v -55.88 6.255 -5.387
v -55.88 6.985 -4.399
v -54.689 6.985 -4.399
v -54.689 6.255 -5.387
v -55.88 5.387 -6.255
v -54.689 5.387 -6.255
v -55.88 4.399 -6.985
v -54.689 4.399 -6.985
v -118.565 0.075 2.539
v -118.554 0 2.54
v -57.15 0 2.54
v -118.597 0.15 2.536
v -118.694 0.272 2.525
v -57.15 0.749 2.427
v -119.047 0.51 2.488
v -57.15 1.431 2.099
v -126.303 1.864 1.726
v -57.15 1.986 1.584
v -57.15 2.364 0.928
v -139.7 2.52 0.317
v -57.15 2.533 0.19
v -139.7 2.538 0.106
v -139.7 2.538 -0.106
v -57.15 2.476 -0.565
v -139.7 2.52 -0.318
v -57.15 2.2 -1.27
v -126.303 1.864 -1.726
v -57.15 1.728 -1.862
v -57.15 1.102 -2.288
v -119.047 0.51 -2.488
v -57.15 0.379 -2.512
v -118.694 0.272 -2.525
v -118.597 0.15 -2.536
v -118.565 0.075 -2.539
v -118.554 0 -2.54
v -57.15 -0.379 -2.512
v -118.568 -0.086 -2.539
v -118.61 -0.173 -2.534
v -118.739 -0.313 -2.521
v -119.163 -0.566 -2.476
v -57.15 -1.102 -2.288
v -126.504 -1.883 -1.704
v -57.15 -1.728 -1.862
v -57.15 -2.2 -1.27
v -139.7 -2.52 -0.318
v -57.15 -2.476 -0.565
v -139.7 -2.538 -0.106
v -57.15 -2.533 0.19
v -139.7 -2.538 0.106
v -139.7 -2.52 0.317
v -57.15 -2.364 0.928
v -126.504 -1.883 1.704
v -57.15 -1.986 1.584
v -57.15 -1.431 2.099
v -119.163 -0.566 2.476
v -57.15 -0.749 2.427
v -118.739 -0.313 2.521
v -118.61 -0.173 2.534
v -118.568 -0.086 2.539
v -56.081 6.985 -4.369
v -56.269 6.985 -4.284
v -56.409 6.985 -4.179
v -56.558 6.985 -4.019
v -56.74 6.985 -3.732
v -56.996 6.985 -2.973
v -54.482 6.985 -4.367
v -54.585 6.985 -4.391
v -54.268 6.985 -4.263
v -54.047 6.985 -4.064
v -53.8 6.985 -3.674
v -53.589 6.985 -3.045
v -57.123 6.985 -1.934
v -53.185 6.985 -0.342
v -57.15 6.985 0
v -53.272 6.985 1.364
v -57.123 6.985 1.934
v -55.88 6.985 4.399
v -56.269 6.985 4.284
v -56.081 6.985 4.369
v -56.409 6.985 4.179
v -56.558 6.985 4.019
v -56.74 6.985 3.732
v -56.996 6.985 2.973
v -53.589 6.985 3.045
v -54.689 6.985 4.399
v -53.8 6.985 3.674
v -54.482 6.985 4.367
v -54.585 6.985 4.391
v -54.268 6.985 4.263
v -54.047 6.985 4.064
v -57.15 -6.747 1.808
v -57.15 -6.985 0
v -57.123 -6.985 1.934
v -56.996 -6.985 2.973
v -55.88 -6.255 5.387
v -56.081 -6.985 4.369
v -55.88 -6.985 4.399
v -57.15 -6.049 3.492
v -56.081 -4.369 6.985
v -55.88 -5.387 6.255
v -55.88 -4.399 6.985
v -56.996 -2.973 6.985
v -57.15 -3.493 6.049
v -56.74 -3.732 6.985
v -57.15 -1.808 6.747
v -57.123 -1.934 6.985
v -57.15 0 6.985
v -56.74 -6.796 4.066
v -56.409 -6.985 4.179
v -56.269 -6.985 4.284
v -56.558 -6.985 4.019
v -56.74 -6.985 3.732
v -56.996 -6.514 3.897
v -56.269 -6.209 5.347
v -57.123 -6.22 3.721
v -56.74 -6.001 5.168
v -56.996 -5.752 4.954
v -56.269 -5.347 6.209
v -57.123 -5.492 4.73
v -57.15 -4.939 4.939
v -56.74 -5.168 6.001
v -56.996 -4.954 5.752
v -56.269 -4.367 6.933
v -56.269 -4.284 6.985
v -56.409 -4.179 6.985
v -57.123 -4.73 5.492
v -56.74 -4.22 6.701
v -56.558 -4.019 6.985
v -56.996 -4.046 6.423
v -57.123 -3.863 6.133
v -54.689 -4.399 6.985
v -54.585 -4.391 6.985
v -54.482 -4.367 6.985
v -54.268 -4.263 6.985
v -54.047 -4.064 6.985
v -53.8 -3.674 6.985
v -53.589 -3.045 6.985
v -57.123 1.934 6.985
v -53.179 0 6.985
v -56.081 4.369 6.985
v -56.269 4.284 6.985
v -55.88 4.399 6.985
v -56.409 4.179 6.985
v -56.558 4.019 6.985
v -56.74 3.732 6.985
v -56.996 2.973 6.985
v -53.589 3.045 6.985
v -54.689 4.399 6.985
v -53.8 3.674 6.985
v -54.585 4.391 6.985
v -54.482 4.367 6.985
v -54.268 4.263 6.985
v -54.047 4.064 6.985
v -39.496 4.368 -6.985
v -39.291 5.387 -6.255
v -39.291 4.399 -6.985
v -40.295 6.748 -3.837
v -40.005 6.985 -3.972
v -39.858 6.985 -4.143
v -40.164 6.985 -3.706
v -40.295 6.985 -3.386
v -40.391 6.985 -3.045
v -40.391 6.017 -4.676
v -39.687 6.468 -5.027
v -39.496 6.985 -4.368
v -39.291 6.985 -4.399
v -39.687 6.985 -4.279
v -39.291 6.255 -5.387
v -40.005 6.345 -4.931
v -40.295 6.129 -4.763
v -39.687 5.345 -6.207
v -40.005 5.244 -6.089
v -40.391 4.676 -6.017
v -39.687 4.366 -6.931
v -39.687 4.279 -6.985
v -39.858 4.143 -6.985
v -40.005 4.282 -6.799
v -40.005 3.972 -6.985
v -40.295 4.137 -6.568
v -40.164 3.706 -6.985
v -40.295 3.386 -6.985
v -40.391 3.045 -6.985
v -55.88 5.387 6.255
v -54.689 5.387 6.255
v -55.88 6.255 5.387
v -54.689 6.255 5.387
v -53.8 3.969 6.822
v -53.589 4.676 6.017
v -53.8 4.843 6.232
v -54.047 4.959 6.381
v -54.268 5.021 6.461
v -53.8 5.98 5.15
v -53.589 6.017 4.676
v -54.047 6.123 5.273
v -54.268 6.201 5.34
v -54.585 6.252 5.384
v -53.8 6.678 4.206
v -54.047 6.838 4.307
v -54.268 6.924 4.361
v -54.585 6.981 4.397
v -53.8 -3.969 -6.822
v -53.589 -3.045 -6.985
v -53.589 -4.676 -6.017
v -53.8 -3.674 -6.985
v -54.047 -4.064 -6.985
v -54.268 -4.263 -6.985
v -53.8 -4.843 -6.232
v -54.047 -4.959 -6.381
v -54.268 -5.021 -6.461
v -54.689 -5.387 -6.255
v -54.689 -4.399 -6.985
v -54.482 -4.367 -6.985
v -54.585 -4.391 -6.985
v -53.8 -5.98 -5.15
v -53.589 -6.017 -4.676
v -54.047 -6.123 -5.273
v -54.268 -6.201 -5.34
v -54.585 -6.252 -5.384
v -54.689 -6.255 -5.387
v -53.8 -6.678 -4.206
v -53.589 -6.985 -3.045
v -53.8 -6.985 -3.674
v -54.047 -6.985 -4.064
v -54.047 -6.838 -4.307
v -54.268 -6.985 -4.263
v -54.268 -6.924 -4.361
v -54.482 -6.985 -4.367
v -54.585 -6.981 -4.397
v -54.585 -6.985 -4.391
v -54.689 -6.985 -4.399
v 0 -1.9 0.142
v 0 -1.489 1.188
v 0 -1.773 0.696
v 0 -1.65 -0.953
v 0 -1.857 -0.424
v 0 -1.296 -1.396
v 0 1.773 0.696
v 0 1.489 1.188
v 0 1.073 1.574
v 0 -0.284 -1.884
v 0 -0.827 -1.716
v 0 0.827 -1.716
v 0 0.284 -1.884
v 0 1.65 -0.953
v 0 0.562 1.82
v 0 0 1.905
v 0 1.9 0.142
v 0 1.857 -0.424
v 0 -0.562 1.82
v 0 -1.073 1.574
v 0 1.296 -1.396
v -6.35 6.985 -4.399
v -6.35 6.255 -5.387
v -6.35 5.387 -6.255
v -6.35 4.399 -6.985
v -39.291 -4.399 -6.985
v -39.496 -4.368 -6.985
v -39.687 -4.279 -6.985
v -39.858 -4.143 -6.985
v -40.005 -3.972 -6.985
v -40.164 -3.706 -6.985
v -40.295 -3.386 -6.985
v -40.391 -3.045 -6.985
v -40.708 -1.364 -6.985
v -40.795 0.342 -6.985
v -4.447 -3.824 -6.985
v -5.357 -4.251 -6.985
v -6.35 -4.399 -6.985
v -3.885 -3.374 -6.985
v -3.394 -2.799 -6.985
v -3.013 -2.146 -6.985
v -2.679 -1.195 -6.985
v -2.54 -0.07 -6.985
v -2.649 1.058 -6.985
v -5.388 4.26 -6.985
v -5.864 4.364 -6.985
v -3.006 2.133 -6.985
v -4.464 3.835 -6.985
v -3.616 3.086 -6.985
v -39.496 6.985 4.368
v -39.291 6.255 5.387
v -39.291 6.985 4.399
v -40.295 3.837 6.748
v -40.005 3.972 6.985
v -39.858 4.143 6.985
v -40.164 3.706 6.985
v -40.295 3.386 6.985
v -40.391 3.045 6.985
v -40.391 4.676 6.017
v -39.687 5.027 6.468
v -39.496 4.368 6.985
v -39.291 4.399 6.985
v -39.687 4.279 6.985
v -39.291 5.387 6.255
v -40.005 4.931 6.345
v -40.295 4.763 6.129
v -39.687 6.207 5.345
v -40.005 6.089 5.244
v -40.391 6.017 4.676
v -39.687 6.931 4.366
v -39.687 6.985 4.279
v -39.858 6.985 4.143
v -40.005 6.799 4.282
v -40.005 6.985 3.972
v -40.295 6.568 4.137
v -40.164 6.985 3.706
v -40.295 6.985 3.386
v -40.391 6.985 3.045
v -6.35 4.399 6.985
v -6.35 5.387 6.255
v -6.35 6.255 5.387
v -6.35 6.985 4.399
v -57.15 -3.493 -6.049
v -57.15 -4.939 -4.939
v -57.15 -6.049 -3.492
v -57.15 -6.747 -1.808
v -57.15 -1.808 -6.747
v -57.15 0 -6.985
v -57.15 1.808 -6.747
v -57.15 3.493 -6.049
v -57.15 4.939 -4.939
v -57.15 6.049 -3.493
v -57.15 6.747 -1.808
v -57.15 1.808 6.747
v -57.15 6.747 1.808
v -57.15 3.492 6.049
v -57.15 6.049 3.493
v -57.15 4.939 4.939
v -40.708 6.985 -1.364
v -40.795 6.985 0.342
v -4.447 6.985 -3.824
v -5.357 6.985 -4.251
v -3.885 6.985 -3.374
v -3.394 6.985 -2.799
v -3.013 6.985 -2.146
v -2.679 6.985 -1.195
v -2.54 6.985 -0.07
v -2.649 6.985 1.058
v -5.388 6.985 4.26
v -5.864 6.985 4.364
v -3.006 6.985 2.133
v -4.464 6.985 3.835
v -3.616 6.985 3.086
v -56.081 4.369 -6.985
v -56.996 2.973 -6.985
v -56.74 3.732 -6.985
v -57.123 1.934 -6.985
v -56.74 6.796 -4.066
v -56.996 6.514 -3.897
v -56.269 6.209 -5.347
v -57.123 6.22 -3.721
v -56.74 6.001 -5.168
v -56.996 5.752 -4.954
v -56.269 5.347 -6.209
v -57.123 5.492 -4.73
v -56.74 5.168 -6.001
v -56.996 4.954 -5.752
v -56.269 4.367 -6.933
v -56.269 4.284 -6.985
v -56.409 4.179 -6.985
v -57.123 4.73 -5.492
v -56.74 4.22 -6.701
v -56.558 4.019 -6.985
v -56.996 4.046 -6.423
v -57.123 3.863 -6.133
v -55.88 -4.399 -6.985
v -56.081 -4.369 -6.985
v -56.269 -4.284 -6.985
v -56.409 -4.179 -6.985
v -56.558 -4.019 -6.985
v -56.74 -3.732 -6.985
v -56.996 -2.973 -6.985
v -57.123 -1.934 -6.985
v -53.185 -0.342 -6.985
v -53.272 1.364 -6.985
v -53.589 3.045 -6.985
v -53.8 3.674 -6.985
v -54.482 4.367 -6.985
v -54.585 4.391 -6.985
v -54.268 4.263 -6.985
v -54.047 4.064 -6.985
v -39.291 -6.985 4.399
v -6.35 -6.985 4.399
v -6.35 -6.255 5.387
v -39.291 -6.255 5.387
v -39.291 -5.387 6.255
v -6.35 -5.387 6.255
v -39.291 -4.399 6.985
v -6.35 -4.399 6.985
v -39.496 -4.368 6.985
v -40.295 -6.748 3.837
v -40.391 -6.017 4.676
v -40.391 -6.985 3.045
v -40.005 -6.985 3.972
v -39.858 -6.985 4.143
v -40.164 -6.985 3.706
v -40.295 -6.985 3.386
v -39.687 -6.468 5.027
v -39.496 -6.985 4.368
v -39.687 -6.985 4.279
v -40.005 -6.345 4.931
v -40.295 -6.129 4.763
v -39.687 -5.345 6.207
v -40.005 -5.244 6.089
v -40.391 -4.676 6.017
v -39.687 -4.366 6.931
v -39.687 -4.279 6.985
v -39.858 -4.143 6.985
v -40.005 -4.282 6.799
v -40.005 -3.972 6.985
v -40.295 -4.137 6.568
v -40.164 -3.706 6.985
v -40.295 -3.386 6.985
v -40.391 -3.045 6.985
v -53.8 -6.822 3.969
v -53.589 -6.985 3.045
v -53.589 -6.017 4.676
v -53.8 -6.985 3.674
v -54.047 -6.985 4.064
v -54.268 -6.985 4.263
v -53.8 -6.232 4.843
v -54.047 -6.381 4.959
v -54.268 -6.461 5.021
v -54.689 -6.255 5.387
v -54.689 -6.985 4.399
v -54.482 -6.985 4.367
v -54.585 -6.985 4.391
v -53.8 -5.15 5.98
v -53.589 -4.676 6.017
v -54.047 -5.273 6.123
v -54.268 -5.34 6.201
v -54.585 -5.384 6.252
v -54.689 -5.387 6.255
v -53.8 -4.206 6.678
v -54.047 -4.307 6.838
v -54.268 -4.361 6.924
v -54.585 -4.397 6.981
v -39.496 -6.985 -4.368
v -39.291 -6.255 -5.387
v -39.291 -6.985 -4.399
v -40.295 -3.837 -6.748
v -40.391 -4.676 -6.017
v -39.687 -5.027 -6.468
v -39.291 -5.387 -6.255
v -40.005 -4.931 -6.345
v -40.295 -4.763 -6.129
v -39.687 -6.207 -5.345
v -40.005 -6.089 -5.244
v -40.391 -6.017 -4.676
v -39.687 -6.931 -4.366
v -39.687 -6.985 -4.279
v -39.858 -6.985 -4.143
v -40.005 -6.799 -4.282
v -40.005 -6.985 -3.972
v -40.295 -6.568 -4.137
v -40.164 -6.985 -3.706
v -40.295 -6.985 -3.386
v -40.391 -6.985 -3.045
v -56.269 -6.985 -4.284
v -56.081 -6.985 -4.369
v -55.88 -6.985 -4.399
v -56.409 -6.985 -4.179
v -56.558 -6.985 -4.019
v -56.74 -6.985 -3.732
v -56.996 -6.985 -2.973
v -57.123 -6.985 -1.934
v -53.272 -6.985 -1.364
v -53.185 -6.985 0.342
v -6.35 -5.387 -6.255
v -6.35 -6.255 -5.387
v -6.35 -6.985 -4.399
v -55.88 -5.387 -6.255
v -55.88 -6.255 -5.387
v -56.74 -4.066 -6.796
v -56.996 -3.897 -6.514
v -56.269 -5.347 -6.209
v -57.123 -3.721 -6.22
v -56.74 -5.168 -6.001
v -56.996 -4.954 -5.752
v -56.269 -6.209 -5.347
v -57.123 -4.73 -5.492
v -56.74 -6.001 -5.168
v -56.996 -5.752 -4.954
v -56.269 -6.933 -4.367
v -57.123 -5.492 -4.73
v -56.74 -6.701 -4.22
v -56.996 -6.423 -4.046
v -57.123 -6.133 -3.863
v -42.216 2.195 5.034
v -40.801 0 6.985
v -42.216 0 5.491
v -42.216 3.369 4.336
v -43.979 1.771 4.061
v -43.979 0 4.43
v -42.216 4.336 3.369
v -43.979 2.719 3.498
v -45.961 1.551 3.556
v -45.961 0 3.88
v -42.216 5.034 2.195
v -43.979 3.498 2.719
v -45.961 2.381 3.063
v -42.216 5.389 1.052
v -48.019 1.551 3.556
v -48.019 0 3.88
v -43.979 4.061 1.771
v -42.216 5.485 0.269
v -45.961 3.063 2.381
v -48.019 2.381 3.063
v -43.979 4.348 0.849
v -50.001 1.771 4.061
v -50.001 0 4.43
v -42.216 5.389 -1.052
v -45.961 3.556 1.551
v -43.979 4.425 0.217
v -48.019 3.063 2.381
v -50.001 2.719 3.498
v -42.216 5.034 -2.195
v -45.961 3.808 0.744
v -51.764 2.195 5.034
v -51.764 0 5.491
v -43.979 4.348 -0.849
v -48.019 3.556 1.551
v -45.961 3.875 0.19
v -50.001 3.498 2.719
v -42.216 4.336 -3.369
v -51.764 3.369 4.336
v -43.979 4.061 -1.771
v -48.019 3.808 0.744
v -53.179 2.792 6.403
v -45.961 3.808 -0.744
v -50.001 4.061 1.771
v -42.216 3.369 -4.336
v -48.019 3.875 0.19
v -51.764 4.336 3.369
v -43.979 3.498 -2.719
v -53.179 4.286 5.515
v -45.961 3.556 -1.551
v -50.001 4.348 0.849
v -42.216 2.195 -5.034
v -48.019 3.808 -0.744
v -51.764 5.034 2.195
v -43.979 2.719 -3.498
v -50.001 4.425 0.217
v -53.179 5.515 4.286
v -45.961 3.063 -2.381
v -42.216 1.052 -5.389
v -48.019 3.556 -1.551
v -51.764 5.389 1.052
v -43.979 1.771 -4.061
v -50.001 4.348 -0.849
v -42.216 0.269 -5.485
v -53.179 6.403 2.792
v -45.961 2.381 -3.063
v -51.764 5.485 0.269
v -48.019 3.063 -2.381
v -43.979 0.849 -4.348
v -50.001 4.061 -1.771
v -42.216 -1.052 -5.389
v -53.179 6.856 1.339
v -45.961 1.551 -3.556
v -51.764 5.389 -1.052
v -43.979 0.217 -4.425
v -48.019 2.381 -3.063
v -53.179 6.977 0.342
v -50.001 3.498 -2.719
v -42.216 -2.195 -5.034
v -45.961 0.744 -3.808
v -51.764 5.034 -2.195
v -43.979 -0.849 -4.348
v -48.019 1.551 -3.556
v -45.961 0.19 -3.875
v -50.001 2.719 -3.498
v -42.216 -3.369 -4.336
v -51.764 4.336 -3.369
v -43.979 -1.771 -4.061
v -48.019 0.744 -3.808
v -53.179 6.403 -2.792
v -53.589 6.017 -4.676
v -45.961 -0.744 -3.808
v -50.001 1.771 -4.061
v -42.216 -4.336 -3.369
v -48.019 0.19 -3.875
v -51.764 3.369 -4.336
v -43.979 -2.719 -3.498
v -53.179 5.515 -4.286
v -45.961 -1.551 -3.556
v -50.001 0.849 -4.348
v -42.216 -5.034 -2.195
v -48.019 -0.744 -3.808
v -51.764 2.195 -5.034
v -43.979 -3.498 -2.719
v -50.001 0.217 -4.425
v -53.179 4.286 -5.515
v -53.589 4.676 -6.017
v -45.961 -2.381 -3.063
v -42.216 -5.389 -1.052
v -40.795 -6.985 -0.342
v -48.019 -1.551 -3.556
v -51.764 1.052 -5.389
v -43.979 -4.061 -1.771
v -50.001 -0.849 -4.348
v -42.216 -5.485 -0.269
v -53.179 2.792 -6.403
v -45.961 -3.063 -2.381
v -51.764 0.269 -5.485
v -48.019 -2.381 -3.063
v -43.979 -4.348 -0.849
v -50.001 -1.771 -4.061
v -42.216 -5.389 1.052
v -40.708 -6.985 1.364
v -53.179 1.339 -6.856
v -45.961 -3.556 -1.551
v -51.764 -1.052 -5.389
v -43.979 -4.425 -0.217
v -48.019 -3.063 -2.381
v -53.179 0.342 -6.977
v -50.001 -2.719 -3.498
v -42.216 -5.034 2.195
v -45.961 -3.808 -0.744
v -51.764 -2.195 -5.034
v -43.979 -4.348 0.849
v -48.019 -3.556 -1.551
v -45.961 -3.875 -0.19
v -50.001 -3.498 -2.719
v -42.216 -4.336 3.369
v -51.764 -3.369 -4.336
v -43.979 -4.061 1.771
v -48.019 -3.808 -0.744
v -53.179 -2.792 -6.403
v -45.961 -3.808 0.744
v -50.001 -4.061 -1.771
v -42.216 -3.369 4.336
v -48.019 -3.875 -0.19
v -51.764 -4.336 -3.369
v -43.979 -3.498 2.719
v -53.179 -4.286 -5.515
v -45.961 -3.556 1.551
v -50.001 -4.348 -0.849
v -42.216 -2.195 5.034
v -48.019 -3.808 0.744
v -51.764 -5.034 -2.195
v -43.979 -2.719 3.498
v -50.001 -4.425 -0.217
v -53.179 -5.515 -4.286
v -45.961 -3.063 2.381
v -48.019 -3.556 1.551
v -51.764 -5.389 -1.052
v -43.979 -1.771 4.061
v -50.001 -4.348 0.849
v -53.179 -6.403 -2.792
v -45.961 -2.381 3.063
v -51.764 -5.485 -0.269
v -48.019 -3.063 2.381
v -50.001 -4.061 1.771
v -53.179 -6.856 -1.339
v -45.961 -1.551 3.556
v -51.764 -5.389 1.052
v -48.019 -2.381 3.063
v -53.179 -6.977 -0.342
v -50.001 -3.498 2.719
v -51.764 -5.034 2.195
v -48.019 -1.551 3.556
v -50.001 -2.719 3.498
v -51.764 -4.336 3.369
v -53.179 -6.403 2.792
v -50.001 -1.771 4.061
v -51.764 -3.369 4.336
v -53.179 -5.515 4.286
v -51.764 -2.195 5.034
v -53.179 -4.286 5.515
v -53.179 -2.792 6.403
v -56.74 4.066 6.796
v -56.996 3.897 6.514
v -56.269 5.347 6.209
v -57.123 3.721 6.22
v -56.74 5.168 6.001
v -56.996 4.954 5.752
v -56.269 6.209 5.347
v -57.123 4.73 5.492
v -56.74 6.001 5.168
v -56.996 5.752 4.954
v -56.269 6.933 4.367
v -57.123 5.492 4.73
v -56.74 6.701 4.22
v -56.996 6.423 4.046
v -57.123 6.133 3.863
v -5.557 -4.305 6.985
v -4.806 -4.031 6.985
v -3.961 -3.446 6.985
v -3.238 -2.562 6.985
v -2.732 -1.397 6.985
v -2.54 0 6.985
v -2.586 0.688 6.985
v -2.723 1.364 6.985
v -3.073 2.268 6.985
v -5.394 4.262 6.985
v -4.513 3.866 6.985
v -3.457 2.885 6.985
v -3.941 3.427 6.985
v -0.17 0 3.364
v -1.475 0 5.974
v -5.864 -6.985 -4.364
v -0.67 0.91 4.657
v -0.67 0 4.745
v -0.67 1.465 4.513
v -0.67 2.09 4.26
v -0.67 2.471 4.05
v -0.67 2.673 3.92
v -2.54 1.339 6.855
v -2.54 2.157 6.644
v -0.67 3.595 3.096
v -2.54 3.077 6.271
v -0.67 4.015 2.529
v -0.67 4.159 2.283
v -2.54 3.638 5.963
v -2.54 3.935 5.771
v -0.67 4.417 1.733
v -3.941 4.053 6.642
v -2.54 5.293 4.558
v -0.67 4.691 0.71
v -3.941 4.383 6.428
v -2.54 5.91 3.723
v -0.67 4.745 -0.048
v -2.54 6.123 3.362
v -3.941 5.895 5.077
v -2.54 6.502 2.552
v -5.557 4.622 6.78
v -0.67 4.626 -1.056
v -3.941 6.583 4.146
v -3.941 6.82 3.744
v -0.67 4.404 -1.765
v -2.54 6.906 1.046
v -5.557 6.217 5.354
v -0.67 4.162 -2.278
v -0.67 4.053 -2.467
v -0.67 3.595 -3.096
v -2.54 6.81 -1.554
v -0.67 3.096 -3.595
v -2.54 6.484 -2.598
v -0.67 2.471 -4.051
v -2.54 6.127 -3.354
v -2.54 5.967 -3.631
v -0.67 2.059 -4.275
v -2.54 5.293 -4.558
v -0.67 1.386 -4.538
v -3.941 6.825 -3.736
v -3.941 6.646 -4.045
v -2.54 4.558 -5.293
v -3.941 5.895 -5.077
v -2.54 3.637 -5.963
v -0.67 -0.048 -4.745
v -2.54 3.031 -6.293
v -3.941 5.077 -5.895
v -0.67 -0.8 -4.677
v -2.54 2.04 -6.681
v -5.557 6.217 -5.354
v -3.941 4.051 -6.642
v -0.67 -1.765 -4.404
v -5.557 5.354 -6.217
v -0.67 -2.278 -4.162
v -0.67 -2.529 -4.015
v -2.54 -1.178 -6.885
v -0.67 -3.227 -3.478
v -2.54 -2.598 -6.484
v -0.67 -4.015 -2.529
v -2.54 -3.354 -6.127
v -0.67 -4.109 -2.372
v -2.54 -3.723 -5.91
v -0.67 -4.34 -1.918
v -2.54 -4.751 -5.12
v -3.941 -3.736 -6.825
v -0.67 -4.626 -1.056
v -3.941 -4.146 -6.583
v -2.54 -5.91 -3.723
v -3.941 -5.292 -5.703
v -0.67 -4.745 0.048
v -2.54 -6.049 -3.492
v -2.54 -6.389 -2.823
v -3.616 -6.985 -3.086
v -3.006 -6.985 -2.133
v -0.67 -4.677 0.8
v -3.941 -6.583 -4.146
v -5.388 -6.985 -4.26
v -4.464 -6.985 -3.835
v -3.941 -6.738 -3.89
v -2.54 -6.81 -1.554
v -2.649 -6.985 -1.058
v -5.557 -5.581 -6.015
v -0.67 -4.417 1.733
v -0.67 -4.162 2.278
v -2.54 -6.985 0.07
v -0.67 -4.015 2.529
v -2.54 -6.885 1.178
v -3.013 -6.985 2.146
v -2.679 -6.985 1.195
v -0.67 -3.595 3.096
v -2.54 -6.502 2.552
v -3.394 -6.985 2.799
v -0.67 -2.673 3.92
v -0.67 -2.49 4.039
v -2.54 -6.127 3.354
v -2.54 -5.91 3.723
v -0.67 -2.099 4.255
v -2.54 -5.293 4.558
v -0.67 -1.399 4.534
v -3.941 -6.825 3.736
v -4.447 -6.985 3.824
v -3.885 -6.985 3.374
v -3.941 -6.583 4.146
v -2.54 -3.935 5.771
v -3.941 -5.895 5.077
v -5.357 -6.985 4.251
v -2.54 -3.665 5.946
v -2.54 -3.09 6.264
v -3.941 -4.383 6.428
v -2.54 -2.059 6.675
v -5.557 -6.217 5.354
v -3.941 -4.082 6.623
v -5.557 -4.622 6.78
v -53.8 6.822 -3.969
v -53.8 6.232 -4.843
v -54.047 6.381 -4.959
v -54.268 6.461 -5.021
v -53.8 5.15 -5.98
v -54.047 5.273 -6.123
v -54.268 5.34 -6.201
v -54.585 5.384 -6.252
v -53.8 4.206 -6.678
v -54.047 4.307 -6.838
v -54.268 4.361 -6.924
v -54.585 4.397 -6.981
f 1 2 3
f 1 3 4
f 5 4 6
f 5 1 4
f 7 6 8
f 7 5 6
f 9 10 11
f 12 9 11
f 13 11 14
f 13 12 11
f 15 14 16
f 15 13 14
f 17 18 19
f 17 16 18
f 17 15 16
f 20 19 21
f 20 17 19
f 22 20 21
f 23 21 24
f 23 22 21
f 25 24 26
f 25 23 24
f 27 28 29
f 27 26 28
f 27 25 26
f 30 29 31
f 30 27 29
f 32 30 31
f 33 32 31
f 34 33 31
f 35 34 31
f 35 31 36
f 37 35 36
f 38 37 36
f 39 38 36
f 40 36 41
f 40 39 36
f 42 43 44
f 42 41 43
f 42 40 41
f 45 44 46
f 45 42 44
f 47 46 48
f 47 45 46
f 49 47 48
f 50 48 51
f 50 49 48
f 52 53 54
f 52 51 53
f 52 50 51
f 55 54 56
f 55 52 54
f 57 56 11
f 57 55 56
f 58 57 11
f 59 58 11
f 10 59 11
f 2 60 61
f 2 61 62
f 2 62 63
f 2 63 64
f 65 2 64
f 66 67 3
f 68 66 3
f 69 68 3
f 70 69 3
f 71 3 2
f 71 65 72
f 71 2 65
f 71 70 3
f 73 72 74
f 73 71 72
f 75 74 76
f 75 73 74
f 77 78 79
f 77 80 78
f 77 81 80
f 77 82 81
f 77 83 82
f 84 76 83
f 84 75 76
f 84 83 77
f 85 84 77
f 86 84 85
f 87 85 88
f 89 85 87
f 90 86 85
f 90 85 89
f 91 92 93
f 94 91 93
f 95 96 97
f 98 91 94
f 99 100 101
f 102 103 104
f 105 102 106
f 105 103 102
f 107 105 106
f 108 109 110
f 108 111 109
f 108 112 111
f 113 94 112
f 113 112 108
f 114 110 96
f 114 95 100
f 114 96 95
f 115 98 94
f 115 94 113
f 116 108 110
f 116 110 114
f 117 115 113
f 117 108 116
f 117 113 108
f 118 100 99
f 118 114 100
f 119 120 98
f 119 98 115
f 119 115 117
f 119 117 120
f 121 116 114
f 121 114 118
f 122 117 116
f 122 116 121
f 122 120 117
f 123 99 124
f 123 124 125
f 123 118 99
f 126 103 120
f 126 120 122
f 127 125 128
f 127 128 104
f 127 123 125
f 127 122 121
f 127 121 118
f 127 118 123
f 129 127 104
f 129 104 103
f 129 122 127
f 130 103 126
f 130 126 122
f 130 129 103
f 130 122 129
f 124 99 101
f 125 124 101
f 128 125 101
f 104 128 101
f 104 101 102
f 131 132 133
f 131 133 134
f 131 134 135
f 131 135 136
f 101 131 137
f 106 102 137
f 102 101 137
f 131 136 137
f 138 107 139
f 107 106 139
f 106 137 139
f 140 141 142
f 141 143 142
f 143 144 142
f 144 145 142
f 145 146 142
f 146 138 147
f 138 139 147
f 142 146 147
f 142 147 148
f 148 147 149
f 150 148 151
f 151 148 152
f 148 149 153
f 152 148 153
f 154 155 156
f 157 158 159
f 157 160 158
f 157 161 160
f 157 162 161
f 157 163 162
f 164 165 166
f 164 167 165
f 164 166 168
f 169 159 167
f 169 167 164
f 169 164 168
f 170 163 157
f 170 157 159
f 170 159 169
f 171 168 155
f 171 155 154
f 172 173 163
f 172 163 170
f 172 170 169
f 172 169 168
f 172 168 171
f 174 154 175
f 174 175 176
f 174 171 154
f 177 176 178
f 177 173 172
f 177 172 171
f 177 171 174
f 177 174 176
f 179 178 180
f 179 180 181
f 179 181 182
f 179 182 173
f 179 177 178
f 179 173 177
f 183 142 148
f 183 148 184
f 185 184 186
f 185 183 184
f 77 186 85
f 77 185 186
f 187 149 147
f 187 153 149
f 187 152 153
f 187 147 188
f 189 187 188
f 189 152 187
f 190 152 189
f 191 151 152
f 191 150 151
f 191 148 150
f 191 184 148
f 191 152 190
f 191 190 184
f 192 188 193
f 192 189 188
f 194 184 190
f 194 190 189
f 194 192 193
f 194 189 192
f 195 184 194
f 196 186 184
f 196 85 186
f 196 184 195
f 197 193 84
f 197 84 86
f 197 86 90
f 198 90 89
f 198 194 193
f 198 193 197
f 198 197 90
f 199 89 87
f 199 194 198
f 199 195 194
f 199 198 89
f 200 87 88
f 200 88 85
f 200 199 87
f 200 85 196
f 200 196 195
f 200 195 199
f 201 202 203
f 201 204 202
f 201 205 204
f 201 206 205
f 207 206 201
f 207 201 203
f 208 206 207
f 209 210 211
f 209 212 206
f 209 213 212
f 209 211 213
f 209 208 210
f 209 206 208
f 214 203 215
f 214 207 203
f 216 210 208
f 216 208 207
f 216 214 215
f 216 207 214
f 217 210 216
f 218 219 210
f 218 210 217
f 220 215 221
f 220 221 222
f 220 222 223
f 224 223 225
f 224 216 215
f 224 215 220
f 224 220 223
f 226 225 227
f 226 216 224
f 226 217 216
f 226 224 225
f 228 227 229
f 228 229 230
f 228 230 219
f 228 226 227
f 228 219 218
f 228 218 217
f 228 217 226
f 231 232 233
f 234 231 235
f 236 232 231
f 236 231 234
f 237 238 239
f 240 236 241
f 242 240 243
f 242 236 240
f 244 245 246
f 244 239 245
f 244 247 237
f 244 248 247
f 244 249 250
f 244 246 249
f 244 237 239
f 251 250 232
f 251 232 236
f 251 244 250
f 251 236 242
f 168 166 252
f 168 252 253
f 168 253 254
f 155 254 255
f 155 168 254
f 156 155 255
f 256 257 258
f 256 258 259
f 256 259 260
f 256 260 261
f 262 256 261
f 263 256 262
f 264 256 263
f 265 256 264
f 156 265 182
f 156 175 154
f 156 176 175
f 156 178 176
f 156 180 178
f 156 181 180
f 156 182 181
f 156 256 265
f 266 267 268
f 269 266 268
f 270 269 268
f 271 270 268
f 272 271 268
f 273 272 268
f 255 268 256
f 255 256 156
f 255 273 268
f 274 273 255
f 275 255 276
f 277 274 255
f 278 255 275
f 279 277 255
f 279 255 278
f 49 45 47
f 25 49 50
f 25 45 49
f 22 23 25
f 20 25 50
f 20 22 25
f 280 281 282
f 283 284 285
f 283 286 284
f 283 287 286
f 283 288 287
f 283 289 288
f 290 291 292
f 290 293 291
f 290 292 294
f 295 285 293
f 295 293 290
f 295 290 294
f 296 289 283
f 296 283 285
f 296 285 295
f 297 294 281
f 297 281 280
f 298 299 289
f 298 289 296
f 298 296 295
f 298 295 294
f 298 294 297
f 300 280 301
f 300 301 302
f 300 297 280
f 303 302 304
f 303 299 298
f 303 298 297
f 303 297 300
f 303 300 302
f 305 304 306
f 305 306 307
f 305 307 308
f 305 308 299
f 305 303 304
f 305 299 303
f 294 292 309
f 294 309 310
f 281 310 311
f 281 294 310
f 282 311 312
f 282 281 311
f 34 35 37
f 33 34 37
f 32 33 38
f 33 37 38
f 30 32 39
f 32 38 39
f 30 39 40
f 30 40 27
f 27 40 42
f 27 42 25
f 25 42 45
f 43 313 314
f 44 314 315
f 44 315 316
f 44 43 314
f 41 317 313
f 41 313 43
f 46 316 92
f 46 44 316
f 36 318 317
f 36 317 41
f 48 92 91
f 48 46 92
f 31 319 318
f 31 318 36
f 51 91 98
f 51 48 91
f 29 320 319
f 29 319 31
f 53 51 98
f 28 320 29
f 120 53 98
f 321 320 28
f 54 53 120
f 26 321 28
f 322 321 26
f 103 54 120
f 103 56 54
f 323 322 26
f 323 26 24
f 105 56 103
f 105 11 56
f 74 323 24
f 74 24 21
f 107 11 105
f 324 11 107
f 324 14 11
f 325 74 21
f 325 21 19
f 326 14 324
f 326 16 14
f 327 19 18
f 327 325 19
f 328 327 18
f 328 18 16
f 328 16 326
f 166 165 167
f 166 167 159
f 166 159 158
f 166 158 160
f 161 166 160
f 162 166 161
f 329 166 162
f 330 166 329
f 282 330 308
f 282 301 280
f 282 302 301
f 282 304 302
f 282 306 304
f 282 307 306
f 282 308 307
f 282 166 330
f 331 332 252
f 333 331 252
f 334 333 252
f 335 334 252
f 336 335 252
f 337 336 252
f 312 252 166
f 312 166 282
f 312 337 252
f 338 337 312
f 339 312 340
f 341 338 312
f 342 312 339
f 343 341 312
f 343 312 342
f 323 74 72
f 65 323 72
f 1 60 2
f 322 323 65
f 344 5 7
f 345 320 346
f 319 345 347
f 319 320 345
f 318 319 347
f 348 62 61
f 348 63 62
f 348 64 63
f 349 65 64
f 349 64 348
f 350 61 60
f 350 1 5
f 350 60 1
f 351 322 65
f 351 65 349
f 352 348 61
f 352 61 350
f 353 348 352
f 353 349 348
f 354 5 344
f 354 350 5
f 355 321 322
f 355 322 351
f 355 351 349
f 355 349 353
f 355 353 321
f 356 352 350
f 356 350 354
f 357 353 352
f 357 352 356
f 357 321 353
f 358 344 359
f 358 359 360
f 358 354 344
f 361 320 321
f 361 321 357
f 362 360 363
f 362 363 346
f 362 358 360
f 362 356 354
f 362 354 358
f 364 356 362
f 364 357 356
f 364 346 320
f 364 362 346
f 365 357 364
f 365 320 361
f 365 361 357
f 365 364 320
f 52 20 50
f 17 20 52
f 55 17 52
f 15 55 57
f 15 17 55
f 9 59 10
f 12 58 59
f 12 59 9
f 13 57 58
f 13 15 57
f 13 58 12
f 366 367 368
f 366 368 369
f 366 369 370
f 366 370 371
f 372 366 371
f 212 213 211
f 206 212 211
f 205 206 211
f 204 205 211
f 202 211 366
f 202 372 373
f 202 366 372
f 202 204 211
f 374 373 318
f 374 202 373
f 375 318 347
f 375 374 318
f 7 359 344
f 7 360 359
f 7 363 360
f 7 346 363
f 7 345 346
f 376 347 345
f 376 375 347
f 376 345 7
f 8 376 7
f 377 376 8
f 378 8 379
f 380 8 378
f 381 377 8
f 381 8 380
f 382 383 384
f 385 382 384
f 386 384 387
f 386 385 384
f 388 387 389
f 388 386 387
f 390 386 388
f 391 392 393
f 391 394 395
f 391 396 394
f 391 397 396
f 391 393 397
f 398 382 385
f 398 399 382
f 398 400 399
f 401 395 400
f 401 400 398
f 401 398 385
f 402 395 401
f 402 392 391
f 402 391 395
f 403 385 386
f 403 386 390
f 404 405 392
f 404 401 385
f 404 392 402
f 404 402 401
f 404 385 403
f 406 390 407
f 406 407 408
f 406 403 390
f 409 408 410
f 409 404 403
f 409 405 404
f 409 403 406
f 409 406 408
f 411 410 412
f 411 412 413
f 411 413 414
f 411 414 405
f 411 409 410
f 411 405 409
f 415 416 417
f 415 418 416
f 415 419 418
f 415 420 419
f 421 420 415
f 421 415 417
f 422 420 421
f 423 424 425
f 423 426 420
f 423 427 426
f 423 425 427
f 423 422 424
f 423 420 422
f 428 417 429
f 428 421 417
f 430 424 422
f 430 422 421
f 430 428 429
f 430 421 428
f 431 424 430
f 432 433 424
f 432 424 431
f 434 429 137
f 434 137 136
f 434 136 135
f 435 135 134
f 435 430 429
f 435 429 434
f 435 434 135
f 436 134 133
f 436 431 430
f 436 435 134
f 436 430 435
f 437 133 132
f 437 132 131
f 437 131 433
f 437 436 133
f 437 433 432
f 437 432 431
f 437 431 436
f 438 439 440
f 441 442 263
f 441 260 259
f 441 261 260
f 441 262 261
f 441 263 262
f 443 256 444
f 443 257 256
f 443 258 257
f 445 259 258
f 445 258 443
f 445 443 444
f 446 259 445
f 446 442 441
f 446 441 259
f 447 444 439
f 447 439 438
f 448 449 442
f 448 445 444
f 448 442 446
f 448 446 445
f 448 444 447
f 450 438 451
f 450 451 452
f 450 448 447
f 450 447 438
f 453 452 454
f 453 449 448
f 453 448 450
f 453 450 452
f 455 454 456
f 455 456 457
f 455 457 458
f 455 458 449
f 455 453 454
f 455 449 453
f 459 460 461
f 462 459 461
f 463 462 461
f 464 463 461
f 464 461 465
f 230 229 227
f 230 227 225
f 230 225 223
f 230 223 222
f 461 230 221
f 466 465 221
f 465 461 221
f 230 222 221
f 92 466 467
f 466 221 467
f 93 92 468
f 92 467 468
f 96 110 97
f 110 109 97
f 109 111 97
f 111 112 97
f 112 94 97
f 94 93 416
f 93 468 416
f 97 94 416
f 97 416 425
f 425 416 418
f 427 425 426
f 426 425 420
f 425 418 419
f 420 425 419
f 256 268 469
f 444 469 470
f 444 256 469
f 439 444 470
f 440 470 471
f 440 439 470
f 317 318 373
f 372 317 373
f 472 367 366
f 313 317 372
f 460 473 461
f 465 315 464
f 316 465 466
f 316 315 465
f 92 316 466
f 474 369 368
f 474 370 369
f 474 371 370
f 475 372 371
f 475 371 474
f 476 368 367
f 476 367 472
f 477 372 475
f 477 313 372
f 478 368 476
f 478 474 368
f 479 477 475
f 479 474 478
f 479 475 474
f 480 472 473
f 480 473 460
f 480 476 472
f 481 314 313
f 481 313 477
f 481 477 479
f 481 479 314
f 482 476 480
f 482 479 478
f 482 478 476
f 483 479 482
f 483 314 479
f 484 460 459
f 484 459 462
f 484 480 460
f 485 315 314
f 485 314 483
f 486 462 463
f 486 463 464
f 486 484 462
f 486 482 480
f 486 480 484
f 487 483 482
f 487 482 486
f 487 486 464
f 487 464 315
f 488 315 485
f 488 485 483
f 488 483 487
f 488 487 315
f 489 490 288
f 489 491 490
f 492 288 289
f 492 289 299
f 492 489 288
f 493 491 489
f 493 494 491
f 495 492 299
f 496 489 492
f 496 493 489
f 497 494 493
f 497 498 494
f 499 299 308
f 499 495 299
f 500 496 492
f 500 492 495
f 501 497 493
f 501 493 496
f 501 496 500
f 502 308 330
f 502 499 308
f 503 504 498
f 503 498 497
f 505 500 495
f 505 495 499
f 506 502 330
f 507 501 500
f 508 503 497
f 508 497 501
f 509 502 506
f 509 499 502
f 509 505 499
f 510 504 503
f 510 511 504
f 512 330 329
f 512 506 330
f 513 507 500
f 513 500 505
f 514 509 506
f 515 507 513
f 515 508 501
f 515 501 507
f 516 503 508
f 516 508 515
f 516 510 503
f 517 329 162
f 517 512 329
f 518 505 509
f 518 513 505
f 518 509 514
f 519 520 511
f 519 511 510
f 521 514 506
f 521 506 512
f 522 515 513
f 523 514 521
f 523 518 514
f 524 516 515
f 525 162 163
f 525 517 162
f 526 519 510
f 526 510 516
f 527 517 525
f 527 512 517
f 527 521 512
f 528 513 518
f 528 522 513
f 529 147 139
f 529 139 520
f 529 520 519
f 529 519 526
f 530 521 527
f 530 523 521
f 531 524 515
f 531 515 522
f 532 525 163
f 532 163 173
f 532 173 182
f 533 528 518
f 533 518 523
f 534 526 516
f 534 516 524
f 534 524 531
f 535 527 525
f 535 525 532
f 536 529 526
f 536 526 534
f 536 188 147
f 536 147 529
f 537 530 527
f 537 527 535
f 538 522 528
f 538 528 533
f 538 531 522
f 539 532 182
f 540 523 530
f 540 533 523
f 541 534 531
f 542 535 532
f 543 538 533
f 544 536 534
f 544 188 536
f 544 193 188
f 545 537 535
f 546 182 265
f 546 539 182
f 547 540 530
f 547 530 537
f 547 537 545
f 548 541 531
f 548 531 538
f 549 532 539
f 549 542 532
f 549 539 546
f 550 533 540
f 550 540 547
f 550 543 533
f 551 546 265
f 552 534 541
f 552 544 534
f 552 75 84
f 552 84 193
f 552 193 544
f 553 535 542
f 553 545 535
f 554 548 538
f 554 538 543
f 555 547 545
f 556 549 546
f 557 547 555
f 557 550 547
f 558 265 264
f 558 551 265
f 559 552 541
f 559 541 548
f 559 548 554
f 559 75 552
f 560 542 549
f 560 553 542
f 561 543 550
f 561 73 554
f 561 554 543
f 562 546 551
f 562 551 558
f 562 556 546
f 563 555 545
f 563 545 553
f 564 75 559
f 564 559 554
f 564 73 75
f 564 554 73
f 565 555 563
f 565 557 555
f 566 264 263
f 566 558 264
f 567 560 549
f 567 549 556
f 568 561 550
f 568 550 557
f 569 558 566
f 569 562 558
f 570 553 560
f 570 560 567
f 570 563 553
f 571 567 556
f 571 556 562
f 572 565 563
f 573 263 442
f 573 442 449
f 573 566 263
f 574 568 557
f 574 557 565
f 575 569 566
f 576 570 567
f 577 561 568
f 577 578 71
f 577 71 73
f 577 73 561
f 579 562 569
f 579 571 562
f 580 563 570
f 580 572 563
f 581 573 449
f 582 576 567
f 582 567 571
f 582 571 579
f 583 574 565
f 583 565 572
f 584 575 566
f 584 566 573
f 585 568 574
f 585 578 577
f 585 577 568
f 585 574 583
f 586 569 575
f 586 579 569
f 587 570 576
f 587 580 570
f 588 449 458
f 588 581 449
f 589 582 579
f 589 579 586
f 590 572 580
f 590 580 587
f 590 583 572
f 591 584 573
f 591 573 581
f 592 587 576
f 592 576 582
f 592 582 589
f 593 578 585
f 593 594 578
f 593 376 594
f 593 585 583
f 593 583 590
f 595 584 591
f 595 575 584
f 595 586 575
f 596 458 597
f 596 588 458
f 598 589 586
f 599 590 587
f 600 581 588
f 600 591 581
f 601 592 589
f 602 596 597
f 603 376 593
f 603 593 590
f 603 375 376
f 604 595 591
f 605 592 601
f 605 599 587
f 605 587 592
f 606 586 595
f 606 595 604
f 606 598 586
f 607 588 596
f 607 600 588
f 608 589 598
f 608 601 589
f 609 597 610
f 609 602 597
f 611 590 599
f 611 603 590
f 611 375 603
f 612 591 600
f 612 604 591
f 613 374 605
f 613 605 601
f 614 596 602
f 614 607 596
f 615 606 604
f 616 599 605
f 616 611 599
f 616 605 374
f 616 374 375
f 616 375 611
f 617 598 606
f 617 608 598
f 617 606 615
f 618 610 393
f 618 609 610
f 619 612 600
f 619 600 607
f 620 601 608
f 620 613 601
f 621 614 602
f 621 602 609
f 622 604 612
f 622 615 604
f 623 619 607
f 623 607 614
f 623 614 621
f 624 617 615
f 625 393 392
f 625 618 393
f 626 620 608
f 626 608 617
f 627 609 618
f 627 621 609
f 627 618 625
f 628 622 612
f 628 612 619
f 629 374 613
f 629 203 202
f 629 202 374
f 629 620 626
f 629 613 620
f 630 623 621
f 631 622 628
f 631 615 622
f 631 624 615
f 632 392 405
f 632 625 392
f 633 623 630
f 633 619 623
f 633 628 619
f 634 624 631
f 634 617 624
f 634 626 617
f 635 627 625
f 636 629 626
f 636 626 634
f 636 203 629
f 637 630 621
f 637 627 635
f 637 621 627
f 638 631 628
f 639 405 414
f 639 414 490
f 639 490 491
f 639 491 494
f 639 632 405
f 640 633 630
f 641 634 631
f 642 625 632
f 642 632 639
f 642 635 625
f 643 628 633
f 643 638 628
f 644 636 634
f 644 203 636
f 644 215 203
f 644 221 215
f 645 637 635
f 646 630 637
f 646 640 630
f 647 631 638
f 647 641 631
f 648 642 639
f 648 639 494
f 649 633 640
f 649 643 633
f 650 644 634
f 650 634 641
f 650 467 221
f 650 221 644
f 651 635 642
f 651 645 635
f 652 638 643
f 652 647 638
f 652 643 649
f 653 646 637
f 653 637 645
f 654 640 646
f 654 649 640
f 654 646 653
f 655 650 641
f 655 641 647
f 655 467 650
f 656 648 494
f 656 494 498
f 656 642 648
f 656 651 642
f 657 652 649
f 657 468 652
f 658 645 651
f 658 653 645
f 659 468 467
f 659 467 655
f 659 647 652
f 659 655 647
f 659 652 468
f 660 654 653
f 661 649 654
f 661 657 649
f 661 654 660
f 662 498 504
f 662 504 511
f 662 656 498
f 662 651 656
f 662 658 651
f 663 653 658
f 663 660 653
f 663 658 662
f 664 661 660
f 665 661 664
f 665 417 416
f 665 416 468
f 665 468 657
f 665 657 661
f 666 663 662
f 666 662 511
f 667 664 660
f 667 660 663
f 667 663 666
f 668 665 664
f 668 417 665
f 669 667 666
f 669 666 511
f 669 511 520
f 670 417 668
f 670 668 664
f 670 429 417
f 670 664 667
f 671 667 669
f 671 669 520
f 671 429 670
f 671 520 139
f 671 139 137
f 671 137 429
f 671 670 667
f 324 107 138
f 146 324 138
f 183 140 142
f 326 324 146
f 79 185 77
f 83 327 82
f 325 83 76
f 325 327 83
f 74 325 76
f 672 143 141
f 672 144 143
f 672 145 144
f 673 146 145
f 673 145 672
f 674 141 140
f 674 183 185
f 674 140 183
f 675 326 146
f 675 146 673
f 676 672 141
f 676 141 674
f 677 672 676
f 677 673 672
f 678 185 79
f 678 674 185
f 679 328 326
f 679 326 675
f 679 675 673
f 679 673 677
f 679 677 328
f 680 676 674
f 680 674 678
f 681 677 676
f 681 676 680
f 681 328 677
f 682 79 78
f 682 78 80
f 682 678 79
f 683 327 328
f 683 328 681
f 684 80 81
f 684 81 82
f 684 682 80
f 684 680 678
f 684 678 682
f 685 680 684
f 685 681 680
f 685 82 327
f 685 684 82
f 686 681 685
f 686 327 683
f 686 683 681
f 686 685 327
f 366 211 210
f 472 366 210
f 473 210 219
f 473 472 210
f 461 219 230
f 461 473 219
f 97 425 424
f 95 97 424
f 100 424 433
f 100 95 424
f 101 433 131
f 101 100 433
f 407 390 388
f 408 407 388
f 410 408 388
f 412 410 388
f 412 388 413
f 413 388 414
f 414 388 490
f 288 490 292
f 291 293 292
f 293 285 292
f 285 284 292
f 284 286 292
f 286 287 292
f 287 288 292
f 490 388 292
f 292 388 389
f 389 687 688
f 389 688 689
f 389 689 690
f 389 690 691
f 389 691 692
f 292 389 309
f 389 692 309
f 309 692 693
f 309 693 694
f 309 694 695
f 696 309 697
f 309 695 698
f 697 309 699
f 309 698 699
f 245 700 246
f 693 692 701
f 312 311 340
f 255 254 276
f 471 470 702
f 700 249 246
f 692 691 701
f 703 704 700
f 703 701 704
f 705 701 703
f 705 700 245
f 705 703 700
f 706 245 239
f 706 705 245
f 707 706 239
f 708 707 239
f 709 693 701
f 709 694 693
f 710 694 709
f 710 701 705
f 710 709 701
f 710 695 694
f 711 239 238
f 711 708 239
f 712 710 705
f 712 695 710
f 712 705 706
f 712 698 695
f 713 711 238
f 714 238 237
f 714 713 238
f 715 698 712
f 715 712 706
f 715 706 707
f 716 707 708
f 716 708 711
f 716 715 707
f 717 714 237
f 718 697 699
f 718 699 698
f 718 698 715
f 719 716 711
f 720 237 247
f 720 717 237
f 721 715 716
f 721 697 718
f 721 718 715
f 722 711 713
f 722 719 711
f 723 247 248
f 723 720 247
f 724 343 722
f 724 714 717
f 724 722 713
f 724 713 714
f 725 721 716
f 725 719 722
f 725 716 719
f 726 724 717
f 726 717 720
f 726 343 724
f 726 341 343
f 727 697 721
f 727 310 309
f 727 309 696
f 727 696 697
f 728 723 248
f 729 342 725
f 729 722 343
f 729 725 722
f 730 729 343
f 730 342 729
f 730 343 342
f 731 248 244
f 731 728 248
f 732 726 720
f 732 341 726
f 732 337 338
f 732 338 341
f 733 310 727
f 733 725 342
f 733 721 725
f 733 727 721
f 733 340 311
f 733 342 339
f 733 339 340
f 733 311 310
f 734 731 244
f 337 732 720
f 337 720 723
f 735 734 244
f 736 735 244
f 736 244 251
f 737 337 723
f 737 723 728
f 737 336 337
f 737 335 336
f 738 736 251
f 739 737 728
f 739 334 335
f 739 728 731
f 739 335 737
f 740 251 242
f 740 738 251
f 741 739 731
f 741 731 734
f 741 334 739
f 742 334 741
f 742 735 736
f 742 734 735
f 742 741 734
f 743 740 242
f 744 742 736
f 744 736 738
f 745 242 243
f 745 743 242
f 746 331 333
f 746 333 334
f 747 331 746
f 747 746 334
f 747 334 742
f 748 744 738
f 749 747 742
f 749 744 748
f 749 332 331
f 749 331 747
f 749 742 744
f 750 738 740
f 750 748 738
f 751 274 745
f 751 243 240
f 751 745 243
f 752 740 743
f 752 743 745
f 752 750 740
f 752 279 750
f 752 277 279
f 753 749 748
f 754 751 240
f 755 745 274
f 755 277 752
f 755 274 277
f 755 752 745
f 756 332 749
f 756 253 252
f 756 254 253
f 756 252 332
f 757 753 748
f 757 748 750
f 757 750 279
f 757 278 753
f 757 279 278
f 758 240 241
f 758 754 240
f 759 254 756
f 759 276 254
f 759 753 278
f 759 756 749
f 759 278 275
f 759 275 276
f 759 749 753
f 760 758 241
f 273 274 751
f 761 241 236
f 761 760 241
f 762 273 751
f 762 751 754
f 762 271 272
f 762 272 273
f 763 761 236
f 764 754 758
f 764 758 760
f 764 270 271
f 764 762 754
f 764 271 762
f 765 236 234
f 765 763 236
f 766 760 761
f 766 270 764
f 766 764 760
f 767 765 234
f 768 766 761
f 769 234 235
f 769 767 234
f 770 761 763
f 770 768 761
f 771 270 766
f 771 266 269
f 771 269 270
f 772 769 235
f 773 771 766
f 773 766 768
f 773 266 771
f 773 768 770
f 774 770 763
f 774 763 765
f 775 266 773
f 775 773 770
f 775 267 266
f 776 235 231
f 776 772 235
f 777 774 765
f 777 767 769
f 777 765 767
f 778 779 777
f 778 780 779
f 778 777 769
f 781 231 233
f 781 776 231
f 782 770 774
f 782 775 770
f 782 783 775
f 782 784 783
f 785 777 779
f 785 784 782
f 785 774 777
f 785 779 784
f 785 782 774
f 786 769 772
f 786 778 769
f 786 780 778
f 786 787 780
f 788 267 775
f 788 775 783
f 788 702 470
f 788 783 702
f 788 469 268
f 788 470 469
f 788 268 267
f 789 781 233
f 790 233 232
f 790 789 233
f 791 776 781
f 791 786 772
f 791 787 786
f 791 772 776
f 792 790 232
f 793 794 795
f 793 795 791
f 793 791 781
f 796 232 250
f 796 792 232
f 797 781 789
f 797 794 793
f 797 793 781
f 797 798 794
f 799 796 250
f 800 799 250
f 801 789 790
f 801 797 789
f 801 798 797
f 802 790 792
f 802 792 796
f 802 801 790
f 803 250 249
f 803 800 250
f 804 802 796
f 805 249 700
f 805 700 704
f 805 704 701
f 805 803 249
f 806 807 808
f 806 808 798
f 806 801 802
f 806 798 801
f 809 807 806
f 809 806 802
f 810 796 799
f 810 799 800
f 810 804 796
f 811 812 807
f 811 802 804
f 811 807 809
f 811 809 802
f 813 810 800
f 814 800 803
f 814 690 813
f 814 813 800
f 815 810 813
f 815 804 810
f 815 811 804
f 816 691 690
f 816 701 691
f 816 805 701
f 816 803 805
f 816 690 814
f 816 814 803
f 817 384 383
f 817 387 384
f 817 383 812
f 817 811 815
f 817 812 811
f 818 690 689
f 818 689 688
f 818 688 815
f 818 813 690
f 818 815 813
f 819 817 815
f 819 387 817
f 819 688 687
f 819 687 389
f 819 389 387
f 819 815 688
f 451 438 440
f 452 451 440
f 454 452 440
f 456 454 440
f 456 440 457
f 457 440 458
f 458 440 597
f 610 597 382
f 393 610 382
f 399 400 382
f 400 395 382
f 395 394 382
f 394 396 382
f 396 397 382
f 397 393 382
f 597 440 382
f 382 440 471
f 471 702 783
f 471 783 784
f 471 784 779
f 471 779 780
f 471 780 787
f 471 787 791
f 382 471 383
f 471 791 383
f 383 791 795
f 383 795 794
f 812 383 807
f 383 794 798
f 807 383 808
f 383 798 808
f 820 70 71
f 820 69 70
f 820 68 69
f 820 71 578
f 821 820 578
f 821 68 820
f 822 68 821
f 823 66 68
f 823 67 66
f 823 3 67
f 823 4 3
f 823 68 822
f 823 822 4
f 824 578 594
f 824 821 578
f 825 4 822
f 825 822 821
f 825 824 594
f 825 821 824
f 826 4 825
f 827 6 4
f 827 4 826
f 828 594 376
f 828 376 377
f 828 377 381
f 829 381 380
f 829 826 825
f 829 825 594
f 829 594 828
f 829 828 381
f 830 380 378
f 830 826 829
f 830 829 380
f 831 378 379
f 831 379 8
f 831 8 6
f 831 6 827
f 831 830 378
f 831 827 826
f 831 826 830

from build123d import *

# Parameters (mm, degrees)
F3_W        = 1.8414998049
F3_H        = 12.7
F3_W_2      = 12.7
F3_H_2      = 1.8414998049
F1_FACE_R   = 6.985
F1_FACE_R_2 = 2.54
F4_DEPTH    = 59.8805
F5_DEPTH    = 12.7


with BuildPart() as f1:
    # F0 (on Front) → F1 (revolve)
    with BuildSketch(Plane.XZ):
        with BuildLine():
            Line((-139.7, 0), (0, 0))
            Line((0, 0), (0, 1.905))
            ThreePointArc((0, 1.905), (-1.8598719395, 6.3951280605), (-6.35, 8.255))
            Line((-6.35, 8.255), (-39.2910341604, 8.255))
            ThreePointArc((-39.2910341604, 8.255), (-39.9260341604, 8.0848522628), (-40.3908864232, 7.62))
            ThreePointArc((-40.3908864232, 7.62), (-46.99, 3.81), (-53.5891135768, 7.62))
            ThreePointArc((-53.5891135768, 7.62), (-54.0539658396, 8.0848522628), (-54.6889658396, 8.255))
            Line((-54.6889658396, 8.255), (-55.88, 8.255))
            ThreePointArc((-55.88, 8.255), (-56.7780256121, 7.8830256121), (-57.15, 6.985))
            Line((-57.15, 6.985), (-57.15, 2.54))
            Line((-57.15, 2.54), (-139.7, 2.54))
            Line((-139.7, 2.54), (-139.7, 0))
        make_face()
    revolve(axis=Axis((31.713694334, 0, 0), (-1, 0, 0)))

    # F3 (on Right) + F1_face (on face) → F4 (cut)
    with BuildSketch(Plane.YZ):
        with Locations((7.9057499024, 0)):
            Rectangle(F3_W, F3_H)
        with Locations((0, 7.9057499024)):
            Rectangle(F3_W_2, F3_H_2)
        with Locations((-7.9057499024, 0)):
            Rectangle(F3_W, F3_H)
        with Locations((0, -7.9057499024)):
            Rectangle(F3_W_2, F3_H_2)
    with BuildSketch(Plane(origin=(-57.15, 0, 0), x_dir=(0, -1, 0), z_dir=(-1, 0, 0))):
        Circle(F1_FACE_R)
        Circle(F1_FACE_R_2, mode=Mode.SUBTRACT)
    extrude(amount=-F4_DEPTH, dir=(1, 0, 0), mode=Mode.SUBTRACT)

    # F2 (on Front) → F5 (cut, symmetric)
    with BuildSketch(Plane.XZ):
        Polygon((-139.7, 2.54), (-139.7, 0.3175), (-118.5543250005, 2.54), align=None)
        Polygon((-139.7, -0.3175), (-139.7, -2.54), (-118.5543250005, -2.54), align=None)
    extrude(amount=F5_DEPTH, both=True, mode=Mode.SUBTRACT)


solid = f1.part
